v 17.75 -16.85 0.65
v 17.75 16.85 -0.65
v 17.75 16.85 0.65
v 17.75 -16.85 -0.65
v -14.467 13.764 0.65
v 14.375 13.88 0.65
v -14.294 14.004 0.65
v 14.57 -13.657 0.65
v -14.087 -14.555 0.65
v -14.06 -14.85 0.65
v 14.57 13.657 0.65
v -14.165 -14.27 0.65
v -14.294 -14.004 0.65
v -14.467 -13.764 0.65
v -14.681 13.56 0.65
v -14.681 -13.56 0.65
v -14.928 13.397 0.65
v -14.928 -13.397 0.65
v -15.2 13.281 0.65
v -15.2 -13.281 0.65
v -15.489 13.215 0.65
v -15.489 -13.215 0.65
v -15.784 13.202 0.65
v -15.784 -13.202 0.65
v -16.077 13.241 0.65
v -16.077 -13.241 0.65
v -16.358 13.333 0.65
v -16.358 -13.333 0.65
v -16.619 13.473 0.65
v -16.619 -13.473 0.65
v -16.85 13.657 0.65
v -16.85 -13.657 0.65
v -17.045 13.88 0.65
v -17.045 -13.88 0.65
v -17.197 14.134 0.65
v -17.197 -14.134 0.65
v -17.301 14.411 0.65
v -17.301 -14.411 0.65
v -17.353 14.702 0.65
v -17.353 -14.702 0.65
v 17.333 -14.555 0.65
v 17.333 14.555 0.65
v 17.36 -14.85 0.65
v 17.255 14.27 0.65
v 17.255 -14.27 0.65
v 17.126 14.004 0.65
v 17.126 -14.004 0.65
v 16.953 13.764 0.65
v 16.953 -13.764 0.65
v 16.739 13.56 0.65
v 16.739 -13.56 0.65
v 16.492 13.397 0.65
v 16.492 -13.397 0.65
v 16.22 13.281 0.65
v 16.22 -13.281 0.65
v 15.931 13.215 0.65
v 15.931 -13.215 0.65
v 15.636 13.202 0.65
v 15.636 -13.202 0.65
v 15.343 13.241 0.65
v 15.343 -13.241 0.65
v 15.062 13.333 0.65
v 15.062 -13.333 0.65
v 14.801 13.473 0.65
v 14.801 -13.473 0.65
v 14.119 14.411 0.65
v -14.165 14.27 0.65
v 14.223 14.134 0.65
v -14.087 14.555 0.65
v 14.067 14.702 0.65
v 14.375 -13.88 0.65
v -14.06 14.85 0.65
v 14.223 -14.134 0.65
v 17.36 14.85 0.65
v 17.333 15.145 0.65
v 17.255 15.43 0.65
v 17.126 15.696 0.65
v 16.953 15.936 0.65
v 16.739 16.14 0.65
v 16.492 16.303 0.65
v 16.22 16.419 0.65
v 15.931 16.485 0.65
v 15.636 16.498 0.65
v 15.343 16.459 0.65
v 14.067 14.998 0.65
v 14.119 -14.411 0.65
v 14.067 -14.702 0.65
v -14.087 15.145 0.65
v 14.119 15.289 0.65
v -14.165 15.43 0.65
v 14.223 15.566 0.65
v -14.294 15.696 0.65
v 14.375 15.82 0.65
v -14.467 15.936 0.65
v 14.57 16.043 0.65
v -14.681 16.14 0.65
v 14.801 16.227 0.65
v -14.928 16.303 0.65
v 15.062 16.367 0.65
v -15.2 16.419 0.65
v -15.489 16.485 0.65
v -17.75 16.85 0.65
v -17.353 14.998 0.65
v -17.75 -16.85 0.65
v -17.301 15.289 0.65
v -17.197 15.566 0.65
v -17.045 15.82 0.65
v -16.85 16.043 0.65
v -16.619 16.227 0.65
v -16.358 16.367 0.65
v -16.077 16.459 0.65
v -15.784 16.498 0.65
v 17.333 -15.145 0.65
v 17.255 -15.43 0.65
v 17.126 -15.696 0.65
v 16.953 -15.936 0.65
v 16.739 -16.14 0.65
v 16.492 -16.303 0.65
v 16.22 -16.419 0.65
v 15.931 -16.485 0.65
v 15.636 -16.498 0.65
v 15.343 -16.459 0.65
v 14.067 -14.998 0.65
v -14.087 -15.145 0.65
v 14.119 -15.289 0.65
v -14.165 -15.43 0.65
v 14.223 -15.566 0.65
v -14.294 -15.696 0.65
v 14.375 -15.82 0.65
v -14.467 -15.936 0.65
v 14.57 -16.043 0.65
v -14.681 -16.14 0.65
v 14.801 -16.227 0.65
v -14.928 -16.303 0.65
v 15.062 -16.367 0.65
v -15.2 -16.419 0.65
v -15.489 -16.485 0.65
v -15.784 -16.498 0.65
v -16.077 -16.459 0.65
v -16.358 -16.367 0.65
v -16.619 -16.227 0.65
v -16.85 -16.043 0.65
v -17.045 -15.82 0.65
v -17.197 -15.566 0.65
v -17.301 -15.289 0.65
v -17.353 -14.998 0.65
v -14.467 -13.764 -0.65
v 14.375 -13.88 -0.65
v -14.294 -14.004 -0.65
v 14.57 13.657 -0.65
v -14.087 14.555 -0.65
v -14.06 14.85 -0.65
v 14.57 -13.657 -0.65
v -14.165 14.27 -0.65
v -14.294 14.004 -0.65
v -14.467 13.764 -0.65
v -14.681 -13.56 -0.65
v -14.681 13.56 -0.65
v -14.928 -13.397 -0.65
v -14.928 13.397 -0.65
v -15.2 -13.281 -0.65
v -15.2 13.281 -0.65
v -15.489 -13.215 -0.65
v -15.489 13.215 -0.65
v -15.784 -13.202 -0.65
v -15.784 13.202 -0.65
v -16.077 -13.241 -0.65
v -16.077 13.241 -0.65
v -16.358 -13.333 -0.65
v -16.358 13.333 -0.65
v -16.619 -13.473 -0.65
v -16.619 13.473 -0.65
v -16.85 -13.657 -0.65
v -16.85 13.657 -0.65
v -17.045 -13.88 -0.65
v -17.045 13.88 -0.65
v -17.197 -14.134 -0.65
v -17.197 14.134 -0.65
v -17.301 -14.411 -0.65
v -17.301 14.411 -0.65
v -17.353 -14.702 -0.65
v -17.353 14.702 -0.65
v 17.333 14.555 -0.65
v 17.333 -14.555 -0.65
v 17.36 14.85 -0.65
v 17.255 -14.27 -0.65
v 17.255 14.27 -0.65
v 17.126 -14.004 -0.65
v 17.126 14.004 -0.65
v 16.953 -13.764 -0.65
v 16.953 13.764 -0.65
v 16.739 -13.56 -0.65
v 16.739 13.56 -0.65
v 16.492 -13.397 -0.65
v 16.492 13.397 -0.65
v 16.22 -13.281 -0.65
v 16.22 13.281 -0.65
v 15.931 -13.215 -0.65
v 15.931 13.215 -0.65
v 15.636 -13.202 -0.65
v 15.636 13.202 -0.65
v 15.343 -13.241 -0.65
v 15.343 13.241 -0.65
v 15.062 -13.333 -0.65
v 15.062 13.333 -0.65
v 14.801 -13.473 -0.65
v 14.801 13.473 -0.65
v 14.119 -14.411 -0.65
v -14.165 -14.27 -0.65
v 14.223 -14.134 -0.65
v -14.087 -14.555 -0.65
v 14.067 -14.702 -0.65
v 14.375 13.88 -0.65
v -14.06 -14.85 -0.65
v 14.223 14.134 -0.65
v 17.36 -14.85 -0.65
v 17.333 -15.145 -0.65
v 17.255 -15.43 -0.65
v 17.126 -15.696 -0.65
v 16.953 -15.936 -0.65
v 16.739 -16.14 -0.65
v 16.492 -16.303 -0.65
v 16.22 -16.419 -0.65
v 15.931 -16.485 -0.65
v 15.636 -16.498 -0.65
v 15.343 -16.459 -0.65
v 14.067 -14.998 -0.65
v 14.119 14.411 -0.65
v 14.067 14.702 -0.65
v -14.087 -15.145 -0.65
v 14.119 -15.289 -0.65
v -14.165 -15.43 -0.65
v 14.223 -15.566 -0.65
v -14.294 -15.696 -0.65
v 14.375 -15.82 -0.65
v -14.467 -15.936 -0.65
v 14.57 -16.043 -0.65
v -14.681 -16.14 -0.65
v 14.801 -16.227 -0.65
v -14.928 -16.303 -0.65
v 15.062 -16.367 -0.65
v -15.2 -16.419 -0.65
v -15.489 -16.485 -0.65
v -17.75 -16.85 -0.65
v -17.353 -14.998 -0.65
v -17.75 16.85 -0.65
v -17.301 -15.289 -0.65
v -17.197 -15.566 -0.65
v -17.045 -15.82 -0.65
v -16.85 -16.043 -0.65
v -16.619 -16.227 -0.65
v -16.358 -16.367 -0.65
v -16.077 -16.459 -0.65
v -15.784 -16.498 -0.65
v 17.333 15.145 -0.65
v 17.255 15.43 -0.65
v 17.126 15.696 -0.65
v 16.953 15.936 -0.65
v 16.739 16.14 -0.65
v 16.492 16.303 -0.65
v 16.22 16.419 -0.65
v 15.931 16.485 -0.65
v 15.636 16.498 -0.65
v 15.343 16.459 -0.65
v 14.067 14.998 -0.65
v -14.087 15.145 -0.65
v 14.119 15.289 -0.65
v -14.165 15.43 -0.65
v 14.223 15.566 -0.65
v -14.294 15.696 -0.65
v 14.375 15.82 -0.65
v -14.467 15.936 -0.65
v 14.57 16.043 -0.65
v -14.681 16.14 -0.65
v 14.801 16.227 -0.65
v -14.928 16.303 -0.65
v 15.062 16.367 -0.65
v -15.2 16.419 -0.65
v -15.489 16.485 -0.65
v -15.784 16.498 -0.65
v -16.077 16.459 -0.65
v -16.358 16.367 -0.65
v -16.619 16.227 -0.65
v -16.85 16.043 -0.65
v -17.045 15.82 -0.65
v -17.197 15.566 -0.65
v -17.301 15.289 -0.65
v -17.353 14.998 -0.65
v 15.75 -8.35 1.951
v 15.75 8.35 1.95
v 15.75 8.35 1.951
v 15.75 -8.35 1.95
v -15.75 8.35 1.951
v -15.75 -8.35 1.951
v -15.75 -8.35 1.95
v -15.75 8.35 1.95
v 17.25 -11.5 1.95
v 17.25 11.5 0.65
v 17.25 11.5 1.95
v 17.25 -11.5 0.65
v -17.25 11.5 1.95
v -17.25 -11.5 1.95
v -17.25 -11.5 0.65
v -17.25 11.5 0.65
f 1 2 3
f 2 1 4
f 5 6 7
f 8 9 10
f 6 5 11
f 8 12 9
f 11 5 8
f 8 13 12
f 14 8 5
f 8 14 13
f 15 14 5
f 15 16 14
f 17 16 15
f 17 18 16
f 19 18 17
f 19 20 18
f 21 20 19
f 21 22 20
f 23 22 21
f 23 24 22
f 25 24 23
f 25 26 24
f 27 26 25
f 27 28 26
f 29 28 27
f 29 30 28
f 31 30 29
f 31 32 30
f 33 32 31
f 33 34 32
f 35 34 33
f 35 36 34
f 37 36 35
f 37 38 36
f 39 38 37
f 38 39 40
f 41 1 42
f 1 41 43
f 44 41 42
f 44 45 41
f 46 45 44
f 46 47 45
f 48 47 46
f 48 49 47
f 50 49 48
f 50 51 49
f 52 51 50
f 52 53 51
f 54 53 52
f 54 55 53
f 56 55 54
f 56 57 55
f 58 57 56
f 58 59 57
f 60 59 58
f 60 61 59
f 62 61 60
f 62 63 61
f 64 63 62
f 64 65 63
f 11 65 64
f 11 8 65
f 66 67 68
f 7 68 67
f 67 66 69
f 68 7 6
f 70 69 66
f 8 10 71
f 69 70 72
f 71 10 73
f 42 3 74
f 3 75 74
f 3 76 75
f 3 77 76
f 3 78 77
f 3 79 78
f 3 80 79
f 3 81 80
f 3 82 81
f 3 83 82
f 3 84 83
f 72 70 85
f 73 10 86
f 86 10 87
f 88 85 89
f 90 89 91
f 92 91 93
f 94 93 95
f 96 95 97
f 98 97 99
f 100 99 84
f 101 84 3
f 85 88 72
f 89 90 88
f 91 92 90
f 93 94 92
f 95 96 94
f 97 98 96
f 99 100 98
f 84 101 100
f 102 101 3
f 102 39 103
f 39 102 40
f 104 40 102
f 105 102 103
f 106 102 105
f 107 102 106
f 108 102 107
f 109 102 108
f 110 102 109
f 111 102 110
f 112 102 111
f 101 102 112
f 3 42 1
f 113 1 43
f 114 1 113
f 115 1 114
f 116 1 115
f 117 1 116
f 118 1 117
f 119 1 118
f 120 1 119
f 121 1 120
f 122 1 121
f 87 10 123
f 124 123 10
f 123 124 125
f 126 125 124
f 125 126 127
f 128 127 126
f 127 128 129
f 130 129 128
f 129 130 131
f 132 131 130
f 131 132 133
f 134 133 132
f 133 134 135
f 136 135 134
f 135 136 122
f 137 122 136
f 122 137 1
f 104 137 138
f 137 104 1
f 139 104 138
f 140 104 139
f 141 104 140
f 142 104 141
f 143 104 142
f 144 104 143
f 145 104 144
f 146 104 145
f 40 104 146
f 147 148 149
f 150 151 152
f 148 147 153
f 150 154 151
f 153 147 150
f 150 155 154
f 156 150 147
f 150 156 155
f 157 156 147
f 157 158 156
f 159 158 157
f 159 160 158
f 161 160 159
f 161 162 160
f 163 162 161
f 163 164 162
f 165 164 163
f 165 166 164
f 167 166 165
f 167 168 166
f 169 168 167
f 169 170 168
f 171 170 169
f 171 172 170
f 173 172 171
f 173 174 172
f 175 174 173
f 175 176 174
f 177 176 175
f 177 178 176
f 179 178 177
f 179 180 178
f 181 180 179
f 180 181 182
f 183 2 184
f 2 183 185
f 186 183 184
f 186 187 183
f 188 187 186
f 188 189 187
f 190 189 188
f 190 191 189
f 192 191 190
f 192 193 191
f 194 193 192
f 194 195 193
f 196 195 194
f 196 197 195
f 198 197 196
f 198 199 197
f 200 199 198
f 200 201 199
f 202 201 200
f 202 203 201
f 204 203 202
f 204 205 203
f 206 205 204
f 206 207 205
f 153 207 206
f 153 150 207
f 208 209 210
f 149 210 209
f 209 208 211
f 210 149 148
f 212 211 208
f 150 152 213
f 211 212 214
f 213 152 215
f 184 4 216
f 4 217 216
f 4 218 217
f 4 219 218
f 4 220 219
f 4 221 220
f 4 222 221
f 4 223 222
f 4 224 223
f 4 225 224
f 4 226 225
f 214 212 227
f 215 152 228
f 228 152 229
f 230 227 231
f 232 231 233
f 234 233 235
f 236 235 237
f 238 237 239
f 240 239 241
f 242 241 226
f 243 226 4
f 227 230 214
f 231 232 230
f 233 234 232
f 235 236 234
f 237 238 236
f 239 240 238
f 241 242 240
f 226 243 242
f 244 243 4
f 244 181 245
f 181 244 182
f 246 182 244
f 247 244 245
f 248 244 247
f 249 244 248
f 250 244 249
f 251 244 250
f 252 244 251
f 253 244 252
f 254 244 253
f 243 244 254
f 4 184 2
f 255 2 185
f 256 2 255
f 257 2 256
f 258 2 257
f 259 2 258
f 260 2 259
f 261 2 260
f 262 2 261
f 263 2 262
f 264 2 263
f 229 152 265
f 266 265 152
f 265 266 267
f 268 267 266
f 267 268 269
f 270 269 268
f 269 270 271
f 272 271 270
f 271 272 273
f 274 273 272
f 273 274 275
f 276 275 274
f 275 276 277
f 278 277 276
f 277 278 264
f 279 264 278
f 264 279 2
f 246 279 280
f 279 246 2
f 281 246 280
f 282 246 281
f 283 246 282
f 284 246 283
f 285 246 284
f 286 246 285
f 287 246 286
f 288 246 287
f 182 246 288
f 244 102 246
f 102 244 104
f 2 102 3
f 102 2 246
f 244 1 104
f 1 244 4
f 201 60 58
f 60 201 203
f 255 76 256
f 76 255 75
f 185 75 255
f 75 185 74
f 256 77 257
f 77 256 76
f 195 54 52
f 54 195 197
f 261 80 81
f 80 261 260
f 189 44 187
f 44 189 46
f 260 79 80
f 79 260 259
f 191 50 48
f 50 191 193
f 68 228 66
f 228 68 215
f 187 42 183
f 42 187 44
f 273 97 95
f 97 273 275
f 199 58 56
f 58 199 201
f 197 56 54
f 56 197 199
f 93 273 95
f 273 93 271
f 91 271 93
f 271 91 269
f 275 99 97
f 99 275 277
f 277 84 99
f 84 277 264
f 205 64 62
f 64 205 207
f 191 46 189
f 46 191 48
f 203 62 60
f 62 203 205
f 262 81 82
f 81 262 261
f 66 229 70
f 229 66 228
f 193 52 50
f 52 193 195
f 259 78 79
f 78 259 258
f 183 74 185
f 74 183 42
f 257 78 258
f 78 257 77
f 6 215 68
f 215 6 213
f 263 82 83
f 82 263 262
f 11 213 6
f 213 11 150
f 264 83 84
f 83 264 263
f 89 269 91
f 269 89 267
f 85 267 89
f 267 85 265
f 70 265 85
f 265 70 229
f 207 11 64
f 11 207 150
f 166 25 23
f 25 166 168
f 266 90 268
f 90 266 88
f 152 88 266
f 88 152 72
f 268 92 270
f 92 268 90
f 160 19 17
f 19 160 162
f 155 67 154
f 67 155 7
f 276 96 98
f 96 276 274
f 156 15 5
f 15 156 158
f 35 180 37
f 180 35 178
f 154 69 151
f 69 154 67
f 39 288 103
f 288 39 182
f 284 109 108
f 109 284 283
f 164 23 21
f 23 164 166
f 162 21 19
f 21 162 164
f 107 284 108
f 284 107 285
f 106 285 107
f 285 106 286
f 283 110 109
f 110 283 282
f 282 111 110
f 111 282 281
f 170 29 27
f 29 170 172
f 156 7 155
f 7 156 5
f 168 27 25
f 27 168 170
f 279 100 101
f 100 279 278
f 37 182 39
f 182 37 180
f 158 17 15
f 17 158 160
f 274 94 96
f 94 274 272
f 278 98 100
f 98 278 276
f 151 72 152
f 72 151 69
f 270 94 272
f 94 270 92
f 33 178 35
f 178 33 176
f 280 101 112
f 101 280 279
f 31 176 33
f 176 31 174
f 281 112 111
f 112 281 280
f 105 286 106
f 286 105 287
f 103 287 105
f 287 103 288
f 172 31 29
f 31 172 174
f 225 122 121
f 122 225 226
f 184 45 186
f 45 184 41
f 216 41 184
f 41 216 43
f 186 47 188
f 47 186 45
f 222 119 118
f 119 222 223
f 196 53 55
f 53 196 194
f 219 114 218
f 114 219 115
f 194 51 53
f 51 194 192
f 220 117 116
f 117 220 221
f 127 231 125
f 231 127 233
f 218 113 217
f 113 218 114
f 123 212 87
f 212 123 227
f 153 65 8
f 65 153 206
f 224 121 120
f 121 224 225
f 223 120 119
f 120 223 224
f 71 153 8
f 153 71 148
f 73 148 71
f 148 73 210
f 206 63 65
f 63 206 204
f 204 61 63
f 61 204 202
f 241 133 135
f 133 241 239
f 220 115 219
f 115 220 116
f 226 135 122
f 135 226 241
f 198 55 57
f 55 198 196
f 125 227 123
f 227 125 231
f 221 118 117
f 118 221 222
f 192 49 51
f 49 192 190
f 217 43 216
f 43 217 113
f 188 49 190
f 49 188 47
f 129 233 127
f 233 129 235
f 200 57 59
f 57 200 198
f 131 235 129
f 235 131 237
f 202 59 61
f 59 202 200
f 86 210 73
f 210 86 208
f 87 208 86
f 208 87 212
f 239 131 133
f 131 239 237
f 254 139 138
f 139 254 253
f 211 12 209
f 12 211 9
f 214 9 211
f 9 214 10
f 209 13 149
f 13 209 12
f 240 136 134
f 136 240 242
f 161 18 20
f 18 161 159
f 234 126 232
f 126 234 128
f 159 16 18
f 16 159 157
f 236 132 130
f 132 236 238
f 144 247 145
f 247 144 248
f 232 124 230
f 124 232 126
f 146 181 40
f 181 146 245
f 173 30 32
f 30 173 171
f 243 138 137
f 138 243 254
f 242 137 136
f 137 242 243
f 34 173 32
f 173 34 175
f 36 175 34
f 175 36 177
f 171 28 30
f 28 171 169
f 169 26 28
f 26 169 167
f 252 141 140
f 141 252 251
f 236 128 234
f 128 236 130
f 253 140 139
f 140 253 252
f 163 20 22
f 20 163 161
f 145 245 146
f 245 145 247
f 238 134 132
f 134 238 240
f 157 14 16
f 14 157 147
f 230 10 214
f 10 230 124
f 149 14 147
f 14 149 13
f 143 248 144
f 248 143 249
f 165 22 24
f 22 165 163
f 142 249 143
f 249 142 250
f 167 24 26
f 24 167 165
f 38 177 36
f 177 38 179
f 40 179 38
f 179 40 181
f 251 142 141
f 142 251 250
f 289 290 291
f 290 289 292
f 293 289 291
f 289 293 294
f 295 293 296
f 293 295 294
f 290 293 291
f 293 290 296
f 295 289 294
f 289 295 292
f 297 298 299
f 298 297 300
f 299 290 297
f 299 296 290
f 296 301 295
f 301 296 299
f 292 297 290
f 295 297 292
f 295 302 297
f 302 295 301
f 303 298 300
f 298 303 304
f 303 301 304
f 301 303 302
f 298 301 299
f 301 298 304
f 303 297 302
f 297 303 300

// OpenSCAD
$fs = 0.3;
$fa = 2;
//DIMENSIONI PCB
oled_pcb_x = 35.50;
oled_pcb_y = 33.70;
oled_pcb_z = 1.3;
oled_pcb_hole_diameter =3.3;
oled_pcb_hole_x = 31.42;
oled_pcb_hole_y = 29.70;

//DIMENSIONI SCHERMO
oled_display_x = 31.50;
oled_display_y = 16.70;
oled_display_z = 1.3;

//oled PCB + holes
difference(){
    color("Blue", 0.8)
    cube([oled_pcb_x, oled_pcb_y, oled_pcb_z], center = true);
    translate([oled_pcb_hole_x/2, oled_pcb_hole_y/2, 0])
        cylinder(h=oled_pcb_z+0.2, r=oled_pcb_hole_diameter/2, center = true);
    translate([-oled_pcb_hole_x/2, oled_pcb_hole_y/2, 0])
        cylinder(h=oled_pcb_z+0.2, r=oled_pcb_hole_diameter/2, center = true);
    translate([oled_pcb_hole_x/2, -oled_pcb_hole_y/2, 0])
        cylinder(h=oled_pcb_z+0.2, r=oled_pcb_hole_diameter/2, center = true);
    translate([-oled_pcb_hole_x/2, -oled_pcb_hole_y/2, 0])
        cylinder(h=oled_pcb_z+0.2, r=oled_pcb_hole_diameter/2, center = true);
}
//oled display
translate([0,0,1.3])
    union(){
        translate([0,0,0.001])
        color("Cyan",1.0)
        cube([oled_display_x, oled_display_y, oled_display_z], center=true);
        color("Black", 1.0)
        cube([34.50, 23.0, 1.3], center = true);
    }
